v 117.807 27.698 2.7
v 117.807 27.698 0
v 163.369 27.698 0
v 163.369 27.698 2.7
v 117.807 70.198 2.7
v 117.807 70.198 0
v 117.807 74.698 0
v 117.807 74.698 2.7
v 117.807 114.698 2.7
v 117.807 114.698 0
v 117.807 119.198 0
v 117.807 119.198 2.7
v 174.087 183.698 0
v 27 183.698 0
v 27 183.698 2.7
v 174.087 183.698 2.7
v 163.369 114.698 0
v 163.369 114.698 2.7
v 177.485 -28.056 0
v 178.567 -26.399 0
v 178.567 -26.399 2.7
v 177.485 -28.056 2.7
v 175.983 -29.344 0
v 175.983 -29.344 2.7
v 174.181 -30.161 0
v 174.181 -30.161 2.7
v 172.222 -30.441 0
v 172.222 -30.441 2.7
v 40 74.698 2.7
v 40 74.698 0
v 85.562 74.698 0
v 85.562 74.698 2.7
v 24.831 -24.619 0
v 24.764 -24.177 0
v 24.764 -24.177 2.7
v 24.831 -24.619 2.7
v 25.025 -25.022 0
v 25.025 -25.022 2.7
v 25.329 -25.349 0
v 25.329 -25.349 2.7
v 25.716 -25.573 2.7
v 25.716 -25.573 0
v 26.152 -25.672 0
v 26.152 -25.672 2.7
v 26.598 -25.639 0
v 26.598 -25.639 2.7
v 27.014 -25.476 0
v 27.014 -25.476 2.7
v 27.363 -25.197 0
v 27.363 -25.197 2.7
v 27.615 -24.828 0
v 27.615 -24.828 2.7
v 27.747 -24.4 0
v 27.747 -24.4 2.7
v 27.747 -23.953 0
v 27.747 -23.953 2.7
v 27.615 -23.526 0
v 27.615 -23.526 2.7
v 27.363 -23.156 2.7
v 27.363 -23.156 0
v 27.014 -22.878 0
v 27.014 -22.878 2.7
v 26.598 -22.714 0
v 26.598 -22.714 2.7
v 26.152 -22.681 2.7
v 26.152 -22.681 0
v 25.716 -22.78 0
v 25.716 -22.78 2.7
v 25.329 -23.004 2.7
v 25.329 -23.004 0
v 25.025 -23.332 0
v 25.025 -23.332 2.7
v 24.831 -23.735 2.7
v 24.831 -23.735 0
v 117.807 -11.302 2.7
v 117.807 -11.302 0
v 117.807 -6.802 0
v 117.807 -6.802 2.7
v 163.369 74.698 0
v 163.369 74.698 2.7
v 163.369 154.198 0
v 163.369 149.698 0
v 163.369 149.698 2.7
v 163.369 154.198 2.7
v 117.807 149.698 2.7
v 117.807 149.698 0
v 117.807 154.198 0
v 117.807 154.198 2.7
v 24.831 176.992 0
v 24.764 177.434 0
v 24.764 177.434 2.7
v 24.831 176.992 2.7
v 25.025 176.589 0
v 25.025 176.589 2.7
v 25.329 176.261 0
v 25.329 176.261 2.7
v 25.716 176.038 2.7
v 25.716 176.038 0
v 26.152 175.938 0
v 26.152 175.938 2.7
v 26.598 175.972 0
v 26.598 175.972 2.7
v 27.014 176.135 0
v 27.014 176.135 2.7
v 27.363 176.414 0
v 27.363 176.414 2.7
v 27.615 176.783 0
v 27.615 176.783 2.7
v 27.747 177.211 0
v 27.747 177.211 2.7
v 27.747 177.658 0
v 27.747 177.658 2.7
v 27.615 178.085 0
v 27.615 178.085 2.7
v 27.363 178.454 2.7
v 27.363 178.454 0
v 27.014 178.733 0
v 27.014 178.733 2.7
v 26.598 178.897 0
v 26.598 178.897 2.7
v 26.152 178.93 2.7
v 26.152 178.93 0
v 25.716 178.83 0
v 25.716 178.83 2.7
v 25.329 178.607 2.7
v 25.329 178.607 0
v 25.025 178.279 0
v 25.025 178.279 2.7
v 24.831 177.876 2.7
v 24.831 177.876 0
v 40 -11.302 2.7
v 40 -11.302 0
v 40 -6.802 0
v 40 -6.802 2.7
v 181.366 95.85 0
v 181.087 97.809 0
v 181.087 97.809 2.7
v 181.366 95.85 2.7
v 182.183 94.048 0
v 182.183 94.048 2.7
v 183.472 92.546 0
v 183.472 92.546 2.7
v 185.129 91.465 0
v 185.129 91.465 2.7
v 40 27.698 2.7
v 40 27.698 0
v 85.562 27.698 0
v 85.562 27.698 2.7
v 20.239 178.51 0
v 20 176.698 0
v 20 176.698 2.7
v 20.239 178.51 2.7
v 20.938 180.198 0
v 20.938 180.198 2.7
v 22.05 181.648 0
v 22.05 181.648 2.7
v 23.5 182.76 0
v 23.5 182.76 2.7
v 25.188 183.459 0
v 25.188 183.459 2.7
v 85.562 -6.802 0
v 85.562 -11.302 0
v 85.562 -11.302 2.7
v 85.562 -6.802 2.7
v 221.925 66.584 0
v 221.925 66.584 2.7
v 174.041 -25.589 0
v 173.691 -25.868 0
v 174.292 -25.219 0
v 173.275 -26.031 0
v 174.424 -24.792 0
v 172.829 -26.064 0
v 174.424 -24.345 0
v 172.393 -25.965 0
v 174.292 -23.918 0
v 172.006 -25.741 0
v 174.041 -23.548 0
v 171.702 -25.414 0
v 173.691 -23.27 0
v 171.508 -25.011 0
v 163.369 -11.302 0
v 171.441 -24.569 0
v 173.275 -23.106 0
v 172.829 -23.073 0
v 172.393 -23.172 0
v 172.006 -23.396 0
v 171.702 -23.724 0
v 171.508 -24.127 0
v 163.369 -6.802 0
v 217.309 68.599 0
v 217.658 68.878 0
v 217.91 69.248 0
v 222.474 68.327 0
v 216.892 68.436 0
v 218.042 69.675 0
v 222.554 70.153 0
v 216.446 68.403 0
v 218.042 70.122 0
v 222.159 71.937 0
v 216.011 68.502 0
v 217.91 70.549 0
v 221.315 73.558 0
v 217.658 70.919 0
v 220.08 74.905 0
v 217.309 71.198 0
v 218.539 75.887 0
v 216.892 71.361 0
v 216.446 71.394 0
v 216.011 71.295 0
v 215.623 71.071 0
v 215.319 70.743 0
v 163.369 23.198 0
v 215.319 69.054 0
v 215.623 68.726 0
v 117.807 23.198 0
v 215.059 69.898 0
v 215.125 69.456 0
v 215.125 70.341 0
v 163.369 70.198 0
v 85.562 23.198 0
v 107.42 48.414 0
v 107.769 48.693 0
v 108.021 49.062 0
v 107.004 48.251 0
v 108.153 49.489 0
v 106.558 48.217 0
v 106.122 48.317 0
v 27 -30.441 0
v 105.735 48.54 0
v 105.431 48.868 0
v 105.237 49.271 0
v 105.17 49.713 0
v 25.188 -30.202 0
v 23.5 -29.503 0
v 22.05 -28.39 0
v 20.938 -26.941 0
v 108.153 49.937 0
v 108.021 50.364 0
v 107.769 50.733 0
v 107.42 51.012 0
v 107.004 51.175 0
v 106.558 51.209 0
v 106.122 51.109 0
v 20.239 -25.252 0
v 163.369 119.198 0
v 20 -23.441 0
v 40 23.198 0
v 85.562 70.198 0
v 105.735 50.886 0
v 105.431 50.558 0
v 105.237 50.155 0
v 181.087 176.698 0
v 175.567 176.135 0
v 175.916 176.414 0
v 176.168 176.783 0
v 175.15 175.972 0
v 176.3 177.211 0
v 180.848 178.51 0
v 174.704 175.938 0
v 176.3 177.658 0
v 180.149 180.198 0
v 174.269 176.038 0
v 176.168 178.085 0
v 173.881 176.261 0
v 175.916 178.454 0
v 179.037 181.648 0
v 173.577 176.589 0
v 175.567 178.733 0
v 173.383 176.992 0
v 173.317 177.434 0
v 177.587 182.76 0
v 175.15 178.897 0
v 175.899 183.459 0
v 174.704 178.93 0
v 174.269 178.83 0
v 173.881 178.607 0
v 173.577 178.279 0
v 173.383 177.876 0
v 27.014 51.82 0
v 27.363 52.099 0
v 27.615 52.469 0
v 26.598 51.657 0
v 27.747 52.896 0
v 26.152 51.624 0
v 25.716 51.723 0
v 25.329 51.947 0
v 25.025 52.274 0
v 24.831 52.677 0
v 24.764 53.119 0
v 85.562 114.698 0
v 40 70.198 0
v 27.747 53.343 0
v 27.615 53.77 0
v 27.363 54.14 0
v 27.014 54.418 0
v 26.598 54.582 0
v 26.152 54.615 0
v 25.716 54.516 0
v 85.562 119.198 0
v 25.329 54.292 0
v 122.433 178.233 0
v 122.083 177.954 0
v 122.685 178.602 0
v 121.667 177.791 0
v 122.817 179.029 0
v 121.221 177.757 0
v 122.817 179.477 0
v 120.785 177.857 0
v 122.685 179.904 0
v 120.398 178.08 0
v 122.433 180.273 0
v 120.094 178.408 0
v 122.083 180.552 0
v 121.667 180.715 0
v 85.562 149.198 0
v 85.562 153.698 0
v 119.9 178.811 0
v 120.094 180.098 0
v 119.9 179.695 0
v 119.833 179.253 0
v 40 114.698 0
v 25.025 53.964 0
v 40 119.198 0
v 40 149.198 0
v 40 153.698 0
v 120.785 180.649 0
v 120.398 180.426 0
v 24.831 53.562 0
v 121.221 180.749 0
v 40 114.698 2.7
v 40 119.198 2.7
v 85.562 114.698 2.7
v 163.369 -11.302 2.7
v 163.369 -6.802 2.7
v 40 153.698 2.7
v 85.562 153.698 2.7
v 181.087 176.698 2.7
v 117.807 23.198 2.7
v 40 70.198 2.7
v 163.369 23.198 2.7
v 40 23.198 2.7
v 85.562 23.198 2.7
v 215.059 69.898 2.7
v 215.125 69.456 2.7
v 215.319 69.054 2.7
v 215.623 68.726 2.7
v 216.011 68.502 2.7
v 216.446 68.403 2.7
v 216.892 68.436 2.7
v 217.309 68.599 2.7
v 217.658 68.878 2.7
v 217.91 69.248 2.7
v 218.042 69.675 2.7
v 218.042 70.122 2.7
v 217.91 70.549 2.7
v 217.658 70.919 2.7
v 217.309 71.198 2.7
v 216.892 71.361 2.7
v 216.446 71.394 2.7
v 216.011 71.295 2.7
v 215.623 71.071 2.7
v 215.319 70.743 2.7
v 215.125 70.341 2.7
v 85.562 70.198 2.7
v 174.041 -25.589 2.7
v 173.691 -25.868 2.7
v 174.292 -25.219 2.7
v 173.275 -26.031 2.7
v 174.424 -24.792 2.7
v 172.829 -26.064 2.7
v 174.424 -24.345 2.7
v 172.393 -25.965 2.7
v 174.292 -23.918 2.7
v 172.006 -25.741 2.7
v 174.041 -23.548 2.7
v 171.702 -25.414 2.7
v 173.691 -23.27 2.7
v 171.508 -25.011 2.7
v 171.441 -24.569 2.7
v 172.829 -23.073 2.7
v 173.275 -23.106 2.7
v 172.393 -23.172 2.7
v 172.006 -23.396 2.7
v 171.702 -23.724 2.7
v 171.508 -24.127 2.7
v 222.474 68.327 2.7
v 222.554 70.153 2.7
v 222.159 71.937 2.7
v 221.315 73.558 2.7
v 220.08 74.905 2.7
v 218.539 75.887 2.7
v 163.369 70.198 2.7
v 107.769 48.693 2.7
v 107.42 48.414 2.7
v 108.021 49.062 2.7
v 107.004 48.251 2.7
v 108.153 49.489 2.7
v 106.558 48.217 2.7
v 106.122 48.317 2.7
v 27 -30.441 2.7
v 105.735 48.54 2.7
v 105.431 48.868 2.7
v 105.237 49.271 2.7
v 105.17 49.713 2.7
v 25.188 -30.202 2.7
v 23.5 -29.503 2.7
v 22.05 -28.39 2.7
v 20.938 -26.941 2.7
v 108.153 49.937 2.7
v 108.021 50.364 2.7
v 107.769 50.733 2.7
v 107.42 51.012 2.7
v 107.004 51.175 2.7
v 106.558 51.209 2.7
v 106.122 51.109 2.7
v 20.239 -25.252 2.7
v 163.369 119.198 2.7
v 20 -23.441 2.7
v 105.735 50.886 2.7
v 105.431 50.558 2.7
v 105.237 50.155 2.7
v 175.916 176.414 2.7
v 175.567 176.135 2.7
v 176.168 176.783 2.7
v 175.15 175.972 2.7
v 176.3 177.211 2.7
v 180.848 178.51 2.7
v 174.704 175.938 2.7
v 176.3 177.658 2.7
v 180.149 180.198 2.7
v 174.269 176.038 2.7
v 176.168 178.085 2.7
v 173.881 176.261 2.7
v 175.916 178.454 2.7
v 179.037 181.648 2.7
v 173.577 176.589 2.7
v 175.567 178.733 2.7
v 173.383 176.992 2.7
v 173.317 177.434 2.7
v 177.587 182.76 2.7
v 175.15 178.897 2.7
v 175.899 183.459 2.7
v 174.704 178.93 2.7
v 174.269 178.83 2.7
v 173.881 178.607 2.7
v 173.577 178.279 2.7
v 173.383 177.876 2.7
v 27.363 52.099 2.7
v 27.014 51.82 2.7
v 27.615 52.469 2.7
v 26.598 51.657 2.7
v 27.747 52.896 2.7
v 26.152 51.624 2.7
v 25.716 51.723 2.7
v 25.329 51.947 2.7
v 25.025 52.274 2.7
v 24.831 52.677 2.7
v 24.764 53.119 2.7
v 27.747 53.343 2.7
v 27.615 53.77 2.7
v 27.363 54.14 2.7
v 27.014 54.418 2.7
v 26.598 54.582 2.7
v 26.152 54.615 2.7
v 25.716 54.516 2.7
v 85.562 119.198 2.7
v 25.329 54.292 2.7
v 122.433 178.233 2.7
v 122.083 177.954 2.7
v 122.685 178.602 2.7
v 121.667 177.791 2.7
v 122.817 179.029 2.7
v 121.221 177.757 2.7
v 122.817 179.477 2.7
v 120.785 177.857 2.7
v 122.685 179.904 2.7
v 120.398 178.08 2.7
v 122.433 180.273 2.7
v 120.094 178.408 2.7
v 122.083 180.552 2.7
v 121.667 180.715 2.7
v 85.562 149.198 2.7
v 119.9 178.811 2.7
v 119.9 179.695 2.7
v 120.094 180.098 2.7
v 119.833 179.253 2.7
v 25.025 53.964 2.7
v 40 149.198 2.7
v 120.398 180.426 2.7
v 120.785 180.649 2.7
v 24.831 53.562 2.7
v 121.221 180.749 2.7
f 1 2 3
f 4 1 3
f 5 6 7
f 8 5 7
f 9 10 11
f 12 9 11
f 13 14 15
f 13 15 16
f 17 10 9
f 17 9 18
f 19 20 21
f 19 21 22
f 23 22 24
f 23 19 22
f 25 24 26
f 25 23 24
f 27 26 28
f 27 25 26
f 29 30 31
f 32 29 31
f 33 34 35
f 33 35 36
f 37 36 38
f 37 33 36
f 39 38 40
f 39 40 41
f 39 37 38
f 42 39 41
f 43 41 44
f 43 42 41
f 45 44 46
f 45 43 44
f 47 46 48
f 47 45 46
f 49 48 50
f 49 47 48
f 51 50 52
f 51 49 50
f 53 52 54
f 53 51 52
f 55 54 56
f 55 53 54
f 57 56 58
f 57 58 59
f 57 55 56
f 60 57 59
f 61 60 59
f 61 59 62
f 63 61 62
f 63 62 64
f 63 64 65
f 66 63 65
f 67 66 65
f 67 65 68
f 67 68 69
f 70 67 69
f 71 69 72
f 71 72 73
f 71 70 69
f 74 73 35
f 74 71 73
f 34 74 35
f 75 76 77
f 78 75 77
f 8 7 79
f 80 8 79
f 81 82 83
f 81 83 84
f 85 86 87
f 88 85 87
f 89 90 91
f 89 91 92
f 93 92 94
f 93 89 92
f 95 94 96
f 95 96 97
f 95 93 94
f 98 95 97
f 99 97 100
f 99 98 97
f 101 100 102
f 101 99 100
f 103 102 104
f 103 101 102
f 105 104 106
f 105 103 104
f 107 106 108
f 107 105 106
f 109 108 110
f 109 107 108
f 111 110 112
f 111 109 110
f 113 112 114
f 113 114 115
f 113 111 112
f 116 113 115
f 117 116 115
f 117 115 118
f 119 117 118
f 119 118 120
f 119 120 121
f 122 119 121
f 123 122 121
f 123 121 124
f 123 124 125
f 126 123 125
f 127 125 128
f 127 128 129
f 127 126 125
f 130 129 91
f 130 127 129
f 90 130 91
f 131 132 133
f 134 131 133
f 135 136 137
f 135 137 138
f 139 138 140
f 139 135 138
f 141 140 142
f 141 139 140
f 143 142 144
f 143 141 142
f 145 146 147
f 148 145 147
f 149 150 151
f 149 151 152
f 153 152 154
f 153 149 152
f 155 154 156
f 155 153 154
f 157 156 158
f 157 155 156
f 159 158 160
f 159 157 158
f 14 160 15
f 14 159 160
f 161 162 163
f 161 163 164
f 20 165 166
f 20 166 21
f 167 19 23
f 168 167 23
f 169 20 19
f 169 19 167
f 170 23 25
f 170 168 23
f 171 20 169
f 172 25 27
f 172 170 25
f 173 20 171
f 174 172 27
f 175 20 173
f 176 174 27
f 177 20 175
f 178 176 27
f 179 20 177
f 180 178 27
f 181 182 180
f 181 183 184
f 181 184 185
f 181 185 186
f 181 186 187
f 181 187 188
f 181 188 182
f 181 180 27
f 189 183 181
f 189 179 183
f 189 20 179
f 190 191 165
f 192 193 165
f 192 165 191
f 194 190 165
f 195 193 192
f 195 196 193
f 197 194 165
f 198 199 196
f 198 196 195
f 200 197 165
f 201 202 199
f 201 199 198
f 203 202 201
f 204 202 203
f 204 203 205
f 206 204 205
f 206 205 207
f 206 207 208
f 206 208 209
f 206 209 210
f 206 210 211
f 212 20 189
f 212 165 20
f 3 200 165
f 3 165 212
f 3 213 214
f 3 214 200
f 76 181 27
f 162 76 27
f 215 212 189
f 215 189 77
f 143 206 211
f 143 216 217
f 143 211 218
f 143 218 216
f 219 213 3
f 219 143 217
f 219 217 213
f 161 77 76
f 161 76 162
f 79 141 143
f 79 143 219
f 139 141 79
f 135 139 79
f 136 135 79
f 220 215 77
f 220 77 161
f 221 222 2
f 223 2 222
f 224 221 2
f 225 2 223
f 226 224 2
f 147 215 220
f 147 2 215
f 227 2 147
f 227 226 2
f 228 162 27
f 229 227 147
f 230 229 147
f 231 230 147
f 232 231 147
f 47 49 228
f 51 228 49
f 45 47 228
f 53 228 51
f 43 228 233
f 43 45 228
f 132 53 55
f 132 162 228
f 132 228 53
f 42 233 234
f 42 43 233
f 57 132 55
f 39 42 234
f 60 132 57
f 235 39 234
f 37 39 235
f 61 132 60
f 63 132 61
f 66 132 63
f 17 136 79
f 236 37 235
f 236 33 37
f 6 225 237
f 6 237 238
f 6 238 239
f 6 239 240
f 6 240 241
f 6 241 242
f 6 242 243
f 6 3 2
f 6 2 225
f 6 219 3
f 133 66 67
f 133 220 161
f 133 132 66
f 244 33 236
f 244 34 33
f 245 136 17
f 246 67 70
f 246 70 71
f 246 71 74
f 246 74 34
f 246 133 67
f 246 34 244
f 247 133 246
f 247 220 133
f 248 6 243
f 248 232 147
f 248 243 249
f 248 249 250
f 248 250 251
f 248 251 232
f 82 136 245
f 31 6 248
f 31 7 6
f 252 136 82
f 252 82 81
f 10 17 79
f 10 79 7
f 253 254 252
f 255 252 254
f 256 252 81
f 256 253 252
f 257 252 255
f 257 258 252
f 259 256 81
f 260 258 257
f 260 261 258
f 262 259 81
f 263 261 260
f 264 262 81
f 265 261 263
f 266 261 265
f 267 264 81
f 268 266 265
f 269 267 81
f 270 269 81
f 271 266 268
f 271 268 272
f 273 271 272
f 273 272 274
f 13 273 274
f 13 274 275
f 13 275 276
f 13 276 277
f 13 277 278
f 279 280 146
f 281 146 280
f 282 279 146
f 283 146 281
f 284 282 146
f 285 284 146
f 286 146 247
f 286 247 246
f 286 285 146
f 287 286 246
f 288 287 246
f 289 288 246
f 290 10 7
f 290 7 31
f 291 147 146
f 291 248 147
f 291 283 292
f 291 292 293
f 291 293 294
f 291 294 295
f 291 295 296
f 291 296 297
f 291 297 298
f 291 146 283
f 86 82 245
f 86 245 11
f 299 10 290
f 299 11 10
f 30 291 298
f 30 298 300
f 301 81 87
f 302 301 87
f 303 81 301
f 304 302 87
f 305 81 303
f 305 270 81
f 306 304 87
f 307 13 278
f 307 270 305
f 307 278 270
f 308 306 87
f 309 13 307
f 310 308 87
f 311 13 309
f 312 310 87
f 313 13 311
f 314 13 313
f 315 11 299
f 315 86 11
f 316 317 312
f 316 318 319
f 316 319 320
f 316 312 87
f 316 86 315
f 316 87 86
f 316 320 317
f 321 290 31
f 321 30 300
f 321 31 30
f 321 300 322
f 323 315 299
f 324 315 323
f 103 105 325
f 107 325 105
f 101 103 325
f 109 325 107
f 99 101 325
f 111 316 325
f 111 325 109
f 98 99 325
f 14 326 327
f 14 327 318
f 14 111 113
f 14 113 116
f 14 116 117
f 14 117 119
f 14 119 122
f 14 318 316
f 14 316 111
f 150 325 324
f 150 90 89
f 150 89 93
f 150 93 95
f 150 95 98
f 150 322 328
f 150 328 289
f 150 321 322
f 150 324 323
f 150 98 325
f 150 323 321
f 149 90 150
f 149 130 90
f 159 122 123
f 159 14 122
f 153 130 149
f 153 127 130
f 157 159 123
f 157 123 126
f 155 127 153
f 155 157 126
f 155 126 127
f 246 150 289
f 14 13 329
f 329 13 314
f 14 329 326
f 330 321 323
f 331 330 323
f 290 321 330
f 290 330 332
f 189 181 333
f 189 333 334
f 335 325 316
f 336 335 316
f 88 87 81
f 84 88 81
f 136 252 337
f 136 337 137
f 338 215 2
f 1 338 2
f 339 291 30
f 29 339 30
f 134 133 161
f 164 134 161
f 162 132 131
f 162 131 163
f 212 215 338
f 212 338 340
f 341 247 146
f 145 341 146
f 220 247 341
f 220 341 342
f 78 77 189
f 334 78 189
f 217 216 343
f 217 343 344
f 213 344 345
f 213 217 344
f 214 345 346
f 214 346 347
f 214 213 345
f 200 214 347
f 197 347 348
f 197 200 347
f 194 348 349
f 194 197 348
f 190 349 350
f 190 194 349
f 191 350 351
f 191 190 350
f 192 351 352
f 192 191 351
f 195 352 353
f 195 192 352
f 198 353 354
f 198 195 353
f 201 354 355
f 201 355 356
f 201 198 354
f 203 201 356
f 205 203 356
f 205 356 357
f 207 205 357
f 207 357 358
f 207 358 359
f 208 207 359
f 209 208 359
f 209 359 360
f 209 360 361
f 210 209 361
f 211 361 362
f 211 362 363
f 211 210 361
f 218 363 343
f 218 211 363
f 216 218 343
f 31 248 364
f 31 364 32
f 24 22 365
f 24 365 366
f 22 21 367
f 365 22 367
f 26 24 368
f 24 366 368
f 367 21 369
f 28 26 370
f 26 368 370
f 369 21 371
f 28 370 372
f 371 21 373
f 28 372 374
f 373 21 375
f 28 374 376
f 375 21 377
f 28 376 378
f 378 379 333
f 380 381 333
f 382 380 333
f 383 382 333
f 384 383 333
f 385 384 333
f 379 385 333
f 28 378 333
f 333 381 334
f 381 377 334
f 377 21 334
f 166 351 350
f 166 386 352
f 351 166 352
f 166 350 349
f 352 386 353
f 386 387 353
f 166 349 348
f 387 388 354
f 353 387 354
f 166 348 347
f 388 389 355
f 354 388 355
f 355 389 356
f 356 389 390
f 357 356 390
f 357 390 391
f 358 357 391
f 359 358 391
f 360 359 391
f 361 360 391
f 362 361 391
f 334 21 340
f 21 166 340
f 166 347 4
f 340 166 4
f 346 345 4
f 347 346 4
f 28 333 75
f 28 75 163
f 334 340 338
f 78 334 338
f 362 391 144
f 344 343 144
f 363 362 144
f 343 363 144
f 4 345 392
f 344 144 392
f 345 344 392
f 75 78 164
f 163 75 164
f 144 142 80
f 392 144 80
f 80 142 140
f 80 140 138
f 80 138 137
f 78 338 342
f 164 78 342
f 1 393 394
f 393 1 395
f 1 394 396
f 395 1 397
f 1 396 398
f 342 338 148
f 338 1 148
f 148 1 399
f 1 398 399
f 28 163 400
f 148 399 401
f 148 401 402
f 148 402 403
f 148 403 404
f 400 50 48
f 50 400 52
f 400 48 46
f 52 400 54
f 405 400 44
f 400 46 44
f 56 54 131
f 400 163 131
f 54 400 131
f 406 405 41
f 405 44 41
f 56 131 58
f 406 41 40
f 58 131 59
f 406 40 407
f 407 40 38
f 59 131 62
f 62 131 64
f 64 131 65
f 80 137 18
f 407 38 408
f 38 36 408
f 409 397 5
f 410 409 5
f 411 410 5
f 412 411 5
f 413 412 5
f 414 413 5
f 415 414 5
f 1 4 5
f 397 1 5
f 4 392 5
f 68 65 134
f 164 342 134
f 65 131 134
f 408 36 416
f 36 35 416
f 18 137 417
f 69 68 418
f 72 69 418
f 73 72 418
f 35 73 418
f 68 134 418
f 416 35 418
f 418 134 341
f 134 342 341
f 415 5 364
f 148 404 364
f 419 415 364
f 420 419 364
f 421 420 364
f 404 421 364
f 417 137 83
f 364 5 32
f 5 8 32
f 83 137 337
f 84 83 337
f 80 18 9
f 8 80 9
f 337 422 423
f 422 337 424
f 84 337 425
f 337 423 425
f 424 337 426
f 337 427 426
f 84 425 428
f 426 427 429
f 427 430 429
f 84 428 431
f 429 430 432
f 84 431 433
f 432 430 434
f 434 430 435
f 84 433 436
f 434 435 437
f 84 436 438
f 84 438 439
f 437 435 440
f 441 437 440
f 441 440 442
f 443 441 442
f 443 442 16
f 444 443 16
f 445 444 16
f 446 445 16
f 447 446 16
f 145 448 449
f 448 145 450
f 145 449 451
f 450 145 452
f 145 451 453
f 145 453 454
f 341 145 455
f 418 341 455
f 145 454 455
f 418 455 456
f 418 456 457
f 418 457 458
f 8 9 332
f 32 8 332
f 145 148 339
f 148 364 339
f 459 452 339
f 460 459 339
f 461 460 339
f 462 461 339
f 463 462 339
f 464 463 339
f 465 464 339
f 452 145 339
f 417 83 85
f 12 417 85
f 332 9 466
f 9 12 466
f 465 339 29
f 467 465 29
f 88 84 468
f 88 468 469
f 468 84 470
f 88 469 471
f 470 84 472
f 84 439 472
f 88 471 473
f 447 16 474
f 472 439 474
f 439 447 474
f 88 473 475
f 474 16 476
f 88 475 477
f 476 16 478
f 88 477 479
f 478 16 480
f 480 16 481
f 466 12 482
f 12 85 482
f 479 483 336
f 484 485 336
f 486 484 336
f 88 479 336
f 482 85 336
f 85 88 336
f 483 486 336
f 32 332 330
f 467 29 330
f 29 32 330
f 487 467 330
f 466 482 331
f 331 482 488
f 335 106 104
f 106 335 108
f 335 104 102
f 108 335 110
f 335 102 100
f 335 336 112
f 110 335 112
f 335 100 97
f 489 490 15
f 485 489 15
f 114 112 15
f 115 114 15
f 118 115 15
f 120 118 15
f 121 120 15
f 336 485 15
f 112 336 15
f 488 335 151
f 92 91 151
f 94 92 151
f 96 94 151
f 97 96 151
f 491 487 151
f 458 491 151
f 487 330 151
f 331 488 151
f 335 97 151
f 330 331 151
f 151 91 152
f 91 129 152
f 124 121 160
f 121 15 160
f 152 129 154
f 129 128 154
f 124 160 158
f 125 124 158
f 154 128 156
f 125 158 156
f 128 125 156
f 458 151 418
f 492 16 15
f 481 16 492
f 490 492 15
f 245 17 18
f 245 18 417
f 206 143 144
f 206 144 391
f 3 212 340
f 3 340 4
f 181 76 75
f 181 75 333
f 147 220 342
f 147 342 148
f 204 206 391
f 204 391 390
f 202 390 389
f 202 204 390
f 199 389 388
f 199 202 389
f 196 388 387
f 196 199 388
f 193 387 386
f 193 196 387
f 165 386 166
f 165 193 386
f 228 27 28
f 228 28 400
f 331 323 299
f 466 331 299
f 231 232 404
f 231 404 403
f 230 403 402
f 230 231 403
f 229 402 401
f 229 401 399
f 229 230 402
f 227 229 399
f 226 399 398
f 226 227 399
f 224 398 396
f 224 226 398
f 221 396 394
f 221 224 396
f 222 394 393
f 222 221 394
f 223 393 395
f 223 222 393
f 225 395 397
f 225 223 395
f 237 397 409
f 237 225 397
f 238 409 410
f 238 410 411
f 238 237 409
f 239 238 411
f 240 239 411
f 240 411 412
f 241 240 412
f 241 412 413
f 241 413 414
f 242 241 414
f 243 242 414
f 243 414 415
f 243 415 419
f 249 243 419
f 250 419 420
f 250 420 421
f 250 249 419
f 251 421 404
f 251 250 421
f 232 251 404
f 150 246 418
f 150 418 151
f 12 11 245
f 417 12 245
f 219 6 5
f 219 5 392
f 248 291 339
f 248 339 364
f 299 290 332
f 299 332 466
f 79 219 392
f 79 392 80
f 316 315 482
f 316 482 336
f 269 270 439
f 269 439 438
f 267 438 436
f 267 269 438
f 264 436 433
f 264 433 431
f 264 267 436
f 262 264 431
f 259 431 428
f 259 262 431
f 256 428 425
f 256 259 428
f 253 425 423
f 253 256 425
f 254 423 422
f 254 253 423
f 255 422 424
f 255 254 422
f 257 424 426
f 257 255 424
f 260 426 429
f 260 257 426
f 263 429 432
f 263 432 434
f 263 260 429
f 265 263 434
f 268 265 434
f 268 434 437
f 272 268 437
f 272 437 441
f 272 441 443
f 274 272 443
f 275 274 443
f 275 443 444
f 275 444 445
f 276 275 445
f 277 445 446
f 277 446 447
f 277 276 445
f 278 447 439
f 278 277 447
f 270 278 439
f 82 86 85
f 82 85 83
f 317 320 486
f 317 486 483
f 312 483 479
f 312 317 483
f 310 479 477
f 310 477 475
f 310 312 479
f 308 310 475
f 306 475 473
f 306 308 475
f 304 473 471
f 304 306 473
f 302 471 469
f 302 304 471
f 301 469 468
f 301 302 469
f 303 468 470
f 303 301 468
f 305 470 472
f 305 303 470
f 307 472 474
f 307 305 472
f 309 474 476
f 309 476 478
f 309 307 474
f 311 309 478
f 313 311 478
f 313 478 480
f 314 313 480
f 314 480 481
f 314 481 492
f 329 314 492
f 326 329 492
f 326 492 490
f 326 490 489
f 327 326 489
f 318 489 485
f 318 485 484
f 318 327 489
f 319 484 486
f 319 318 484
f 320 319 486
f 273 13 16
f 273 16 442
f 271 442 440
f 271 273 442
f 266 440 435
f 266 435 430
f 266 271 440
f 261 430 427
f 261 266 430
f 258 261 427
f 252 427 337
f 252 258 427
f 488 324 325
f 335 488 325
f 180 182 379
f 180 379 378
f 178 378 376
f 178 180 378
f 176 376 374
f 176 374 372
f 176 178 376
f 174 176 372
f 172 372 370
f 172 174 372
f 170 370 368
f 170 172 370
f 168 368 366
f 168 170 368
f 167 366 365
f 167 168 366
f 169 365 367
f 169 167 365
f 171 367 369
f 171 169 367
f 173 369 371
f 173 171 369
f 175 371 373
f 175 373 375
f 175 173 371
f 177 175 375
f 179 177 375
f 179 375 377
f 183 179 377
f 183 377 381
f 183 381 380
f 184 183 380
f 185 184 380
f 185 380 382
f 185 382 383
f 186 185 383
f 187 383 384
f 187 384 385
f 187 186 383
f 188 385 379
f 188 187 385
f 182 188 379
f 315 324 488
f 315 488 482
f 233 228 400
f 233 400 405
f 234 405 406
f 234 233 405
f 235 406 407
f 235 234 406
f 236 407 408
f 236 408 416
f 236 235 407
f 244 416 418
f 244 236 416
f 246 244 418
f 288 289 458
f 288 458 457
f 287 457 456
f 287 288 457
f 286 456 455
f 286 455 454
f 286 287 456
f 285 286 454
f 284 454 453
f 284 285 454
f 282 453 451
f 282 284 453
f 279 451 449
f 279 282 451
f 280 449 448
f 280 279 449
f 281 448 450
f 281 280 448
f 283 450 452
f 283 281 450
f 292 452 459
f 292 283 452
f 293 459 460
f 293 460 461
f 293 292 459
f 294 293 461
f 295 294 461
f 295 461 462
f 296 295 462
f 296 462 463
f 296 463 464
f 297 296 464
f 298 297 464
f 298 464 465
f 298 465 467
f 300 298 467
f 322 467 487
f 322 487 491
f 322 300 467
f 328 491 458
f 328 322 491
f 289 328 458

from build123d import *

# Parameters (mm, degrees)
SKETCH1_R           = 1.5
SKETCH1_W           = 45.562449769
SKETCH1_H           = 4.5
BOSS_EXTRUDE1_DEPTH = 2.7


with BuildPart() as part:
    # Sketch1 → Boss-Extrude1 (new body)
    with BuildSketch(Plane.XY):
        with BuildLine():
            Line((181.0868, 176.698), (181.0868, 97.809302293))
            ThreePointArc((181.0868, 97.809302293), (182.183121351, 94.048108544), (185.128679547, 91.465051085))
            Line((185.128679547, 91.465051085), (218.538914615, 75.886932175))
            ThreePointArc((218.538914615, 75.886932175), (222.158599458, 71.936940245), (221.924958355, 66.584373903))
            Line((221.924958355, 66.584373903), (178.566520277, -26.398891285))
            ThreePointArc((178.566520277, -26.398891285), (175.983463005, -29.344318185), (172.222356084, -30.44058422))
            Line((172.222356084, -30.44058422), (27, -30.44058422))
            ThreePointArc((27, -30.44058422), (22.050252532, -28.390331688), (20, -23.44058422))
            Line((20, -23.44058422), (20, 176.698))
            ThreePointArc((20, 176.698), (22.050252532, 181.647747468), (27, 183.698))
            Line((27, 183.698), (174.0868, 183.698))
            ThreePointArc((174.0868, 183.698), (179.036547468, 181.647747468), (181.0868, 176.698))
        make_face()
        with Locations(Location((216.558534729, 69.898485122, 0), (0, 0, 180))):
            Circle(SKETCH1_R, mode=Mode.SUBTRACT)
        with Locations(Location((106.66988, 49.713, 0), (0, 0, 180))):
            Circle(SKETCH1_R, mode=Mode.SUBTRACT)
        with Locations(Location((26.263876, 53.119376266, 0), (0, 0, 180))):
            Circle(SKETCH1_R, mode=Mode.SUBTRACT)
        with Locations(Location((26.263876266, 177.434123734, 0), (0, 0, 180))):
            Circle(SKETCH1_R, mode=Mode.SUBTRACT)
        with Locations(Location((121.3333, 179.253, 0), (0, 0, 180))):
            Circle(SKETCH1_R, mode=Mode.SUBTRACT)
        with Locations(Location((174.816573734, 177.434123734, 0), (0, 0, 180))):
            Circle(SKETCH1_R, mode=Mode.SUBTRACT)
        with Locations(Location((26.263876, -24.17668422, 0), (0, 0, 180))):
            Circle(SKETCH1_R, mode=Mode.SUBTRACT)
        with Locations(Location((172.941013343, -24.56864608, 0), (0, 0, 180))):
            Circle(SKETCH1_R, mode=Mode.SUBTRACT)
        with Locations((140.588022236, 151.948)):
            Rectangle(SKETCH1_W, SKETCH1_H, mode=Mode.SUBTRACT)
        with Locations((62.781224885, 151.448)):
            Rectangle(SKETCH1_W, SKETCH1_H, mode=Mode.SUBTRACT)
        with Locations((62.781224885, 116.948)):
            Rectangle(SKETCH1_W, SKETCH1_H, mode=Mode.SUBTRACT)
        with Locations((62.781224885, 72.448)):
            Rectangle(SKETCH1_W, SKETCH1_H, mode=Mode.SUBTRACT)
        with Locations((62.781224885, 25.448)):
            Rectangle(SKETCH1_W, SKETCH1_H, mode=Mode.SUBTRACT)
        with Locations((62.781224885, -9.052)):
            Rectangle(SKETCH1_W, SKETCH1_H, mode=Mode.SUBTRACT)
        with Locations((140.588022236, 116.948)):
            Rectangle(SKETCH1_W, SKETCH1_H, mode=Mode.SUBTRACT)
        with Locations((140.588022236, 72.448)):
            Rectangle(SKETCH1_W, SKETCH1_H, mode=Mode.SUBTRACT)
        with Locations((140.588022236, 25.448)):
            Rectangle(SKETCH1_W, SKETCH1_H, mode=Mode.SUBTRACT)
        with Locations((140.588022236, -9.052)):
            Rectangle(SKETCH1_W, SKETCH1_H, mode=Mode.SUBTRACT)
    extrude(amount=BOSS_EXTRUDE1_DEPTH)


solid = part.part
